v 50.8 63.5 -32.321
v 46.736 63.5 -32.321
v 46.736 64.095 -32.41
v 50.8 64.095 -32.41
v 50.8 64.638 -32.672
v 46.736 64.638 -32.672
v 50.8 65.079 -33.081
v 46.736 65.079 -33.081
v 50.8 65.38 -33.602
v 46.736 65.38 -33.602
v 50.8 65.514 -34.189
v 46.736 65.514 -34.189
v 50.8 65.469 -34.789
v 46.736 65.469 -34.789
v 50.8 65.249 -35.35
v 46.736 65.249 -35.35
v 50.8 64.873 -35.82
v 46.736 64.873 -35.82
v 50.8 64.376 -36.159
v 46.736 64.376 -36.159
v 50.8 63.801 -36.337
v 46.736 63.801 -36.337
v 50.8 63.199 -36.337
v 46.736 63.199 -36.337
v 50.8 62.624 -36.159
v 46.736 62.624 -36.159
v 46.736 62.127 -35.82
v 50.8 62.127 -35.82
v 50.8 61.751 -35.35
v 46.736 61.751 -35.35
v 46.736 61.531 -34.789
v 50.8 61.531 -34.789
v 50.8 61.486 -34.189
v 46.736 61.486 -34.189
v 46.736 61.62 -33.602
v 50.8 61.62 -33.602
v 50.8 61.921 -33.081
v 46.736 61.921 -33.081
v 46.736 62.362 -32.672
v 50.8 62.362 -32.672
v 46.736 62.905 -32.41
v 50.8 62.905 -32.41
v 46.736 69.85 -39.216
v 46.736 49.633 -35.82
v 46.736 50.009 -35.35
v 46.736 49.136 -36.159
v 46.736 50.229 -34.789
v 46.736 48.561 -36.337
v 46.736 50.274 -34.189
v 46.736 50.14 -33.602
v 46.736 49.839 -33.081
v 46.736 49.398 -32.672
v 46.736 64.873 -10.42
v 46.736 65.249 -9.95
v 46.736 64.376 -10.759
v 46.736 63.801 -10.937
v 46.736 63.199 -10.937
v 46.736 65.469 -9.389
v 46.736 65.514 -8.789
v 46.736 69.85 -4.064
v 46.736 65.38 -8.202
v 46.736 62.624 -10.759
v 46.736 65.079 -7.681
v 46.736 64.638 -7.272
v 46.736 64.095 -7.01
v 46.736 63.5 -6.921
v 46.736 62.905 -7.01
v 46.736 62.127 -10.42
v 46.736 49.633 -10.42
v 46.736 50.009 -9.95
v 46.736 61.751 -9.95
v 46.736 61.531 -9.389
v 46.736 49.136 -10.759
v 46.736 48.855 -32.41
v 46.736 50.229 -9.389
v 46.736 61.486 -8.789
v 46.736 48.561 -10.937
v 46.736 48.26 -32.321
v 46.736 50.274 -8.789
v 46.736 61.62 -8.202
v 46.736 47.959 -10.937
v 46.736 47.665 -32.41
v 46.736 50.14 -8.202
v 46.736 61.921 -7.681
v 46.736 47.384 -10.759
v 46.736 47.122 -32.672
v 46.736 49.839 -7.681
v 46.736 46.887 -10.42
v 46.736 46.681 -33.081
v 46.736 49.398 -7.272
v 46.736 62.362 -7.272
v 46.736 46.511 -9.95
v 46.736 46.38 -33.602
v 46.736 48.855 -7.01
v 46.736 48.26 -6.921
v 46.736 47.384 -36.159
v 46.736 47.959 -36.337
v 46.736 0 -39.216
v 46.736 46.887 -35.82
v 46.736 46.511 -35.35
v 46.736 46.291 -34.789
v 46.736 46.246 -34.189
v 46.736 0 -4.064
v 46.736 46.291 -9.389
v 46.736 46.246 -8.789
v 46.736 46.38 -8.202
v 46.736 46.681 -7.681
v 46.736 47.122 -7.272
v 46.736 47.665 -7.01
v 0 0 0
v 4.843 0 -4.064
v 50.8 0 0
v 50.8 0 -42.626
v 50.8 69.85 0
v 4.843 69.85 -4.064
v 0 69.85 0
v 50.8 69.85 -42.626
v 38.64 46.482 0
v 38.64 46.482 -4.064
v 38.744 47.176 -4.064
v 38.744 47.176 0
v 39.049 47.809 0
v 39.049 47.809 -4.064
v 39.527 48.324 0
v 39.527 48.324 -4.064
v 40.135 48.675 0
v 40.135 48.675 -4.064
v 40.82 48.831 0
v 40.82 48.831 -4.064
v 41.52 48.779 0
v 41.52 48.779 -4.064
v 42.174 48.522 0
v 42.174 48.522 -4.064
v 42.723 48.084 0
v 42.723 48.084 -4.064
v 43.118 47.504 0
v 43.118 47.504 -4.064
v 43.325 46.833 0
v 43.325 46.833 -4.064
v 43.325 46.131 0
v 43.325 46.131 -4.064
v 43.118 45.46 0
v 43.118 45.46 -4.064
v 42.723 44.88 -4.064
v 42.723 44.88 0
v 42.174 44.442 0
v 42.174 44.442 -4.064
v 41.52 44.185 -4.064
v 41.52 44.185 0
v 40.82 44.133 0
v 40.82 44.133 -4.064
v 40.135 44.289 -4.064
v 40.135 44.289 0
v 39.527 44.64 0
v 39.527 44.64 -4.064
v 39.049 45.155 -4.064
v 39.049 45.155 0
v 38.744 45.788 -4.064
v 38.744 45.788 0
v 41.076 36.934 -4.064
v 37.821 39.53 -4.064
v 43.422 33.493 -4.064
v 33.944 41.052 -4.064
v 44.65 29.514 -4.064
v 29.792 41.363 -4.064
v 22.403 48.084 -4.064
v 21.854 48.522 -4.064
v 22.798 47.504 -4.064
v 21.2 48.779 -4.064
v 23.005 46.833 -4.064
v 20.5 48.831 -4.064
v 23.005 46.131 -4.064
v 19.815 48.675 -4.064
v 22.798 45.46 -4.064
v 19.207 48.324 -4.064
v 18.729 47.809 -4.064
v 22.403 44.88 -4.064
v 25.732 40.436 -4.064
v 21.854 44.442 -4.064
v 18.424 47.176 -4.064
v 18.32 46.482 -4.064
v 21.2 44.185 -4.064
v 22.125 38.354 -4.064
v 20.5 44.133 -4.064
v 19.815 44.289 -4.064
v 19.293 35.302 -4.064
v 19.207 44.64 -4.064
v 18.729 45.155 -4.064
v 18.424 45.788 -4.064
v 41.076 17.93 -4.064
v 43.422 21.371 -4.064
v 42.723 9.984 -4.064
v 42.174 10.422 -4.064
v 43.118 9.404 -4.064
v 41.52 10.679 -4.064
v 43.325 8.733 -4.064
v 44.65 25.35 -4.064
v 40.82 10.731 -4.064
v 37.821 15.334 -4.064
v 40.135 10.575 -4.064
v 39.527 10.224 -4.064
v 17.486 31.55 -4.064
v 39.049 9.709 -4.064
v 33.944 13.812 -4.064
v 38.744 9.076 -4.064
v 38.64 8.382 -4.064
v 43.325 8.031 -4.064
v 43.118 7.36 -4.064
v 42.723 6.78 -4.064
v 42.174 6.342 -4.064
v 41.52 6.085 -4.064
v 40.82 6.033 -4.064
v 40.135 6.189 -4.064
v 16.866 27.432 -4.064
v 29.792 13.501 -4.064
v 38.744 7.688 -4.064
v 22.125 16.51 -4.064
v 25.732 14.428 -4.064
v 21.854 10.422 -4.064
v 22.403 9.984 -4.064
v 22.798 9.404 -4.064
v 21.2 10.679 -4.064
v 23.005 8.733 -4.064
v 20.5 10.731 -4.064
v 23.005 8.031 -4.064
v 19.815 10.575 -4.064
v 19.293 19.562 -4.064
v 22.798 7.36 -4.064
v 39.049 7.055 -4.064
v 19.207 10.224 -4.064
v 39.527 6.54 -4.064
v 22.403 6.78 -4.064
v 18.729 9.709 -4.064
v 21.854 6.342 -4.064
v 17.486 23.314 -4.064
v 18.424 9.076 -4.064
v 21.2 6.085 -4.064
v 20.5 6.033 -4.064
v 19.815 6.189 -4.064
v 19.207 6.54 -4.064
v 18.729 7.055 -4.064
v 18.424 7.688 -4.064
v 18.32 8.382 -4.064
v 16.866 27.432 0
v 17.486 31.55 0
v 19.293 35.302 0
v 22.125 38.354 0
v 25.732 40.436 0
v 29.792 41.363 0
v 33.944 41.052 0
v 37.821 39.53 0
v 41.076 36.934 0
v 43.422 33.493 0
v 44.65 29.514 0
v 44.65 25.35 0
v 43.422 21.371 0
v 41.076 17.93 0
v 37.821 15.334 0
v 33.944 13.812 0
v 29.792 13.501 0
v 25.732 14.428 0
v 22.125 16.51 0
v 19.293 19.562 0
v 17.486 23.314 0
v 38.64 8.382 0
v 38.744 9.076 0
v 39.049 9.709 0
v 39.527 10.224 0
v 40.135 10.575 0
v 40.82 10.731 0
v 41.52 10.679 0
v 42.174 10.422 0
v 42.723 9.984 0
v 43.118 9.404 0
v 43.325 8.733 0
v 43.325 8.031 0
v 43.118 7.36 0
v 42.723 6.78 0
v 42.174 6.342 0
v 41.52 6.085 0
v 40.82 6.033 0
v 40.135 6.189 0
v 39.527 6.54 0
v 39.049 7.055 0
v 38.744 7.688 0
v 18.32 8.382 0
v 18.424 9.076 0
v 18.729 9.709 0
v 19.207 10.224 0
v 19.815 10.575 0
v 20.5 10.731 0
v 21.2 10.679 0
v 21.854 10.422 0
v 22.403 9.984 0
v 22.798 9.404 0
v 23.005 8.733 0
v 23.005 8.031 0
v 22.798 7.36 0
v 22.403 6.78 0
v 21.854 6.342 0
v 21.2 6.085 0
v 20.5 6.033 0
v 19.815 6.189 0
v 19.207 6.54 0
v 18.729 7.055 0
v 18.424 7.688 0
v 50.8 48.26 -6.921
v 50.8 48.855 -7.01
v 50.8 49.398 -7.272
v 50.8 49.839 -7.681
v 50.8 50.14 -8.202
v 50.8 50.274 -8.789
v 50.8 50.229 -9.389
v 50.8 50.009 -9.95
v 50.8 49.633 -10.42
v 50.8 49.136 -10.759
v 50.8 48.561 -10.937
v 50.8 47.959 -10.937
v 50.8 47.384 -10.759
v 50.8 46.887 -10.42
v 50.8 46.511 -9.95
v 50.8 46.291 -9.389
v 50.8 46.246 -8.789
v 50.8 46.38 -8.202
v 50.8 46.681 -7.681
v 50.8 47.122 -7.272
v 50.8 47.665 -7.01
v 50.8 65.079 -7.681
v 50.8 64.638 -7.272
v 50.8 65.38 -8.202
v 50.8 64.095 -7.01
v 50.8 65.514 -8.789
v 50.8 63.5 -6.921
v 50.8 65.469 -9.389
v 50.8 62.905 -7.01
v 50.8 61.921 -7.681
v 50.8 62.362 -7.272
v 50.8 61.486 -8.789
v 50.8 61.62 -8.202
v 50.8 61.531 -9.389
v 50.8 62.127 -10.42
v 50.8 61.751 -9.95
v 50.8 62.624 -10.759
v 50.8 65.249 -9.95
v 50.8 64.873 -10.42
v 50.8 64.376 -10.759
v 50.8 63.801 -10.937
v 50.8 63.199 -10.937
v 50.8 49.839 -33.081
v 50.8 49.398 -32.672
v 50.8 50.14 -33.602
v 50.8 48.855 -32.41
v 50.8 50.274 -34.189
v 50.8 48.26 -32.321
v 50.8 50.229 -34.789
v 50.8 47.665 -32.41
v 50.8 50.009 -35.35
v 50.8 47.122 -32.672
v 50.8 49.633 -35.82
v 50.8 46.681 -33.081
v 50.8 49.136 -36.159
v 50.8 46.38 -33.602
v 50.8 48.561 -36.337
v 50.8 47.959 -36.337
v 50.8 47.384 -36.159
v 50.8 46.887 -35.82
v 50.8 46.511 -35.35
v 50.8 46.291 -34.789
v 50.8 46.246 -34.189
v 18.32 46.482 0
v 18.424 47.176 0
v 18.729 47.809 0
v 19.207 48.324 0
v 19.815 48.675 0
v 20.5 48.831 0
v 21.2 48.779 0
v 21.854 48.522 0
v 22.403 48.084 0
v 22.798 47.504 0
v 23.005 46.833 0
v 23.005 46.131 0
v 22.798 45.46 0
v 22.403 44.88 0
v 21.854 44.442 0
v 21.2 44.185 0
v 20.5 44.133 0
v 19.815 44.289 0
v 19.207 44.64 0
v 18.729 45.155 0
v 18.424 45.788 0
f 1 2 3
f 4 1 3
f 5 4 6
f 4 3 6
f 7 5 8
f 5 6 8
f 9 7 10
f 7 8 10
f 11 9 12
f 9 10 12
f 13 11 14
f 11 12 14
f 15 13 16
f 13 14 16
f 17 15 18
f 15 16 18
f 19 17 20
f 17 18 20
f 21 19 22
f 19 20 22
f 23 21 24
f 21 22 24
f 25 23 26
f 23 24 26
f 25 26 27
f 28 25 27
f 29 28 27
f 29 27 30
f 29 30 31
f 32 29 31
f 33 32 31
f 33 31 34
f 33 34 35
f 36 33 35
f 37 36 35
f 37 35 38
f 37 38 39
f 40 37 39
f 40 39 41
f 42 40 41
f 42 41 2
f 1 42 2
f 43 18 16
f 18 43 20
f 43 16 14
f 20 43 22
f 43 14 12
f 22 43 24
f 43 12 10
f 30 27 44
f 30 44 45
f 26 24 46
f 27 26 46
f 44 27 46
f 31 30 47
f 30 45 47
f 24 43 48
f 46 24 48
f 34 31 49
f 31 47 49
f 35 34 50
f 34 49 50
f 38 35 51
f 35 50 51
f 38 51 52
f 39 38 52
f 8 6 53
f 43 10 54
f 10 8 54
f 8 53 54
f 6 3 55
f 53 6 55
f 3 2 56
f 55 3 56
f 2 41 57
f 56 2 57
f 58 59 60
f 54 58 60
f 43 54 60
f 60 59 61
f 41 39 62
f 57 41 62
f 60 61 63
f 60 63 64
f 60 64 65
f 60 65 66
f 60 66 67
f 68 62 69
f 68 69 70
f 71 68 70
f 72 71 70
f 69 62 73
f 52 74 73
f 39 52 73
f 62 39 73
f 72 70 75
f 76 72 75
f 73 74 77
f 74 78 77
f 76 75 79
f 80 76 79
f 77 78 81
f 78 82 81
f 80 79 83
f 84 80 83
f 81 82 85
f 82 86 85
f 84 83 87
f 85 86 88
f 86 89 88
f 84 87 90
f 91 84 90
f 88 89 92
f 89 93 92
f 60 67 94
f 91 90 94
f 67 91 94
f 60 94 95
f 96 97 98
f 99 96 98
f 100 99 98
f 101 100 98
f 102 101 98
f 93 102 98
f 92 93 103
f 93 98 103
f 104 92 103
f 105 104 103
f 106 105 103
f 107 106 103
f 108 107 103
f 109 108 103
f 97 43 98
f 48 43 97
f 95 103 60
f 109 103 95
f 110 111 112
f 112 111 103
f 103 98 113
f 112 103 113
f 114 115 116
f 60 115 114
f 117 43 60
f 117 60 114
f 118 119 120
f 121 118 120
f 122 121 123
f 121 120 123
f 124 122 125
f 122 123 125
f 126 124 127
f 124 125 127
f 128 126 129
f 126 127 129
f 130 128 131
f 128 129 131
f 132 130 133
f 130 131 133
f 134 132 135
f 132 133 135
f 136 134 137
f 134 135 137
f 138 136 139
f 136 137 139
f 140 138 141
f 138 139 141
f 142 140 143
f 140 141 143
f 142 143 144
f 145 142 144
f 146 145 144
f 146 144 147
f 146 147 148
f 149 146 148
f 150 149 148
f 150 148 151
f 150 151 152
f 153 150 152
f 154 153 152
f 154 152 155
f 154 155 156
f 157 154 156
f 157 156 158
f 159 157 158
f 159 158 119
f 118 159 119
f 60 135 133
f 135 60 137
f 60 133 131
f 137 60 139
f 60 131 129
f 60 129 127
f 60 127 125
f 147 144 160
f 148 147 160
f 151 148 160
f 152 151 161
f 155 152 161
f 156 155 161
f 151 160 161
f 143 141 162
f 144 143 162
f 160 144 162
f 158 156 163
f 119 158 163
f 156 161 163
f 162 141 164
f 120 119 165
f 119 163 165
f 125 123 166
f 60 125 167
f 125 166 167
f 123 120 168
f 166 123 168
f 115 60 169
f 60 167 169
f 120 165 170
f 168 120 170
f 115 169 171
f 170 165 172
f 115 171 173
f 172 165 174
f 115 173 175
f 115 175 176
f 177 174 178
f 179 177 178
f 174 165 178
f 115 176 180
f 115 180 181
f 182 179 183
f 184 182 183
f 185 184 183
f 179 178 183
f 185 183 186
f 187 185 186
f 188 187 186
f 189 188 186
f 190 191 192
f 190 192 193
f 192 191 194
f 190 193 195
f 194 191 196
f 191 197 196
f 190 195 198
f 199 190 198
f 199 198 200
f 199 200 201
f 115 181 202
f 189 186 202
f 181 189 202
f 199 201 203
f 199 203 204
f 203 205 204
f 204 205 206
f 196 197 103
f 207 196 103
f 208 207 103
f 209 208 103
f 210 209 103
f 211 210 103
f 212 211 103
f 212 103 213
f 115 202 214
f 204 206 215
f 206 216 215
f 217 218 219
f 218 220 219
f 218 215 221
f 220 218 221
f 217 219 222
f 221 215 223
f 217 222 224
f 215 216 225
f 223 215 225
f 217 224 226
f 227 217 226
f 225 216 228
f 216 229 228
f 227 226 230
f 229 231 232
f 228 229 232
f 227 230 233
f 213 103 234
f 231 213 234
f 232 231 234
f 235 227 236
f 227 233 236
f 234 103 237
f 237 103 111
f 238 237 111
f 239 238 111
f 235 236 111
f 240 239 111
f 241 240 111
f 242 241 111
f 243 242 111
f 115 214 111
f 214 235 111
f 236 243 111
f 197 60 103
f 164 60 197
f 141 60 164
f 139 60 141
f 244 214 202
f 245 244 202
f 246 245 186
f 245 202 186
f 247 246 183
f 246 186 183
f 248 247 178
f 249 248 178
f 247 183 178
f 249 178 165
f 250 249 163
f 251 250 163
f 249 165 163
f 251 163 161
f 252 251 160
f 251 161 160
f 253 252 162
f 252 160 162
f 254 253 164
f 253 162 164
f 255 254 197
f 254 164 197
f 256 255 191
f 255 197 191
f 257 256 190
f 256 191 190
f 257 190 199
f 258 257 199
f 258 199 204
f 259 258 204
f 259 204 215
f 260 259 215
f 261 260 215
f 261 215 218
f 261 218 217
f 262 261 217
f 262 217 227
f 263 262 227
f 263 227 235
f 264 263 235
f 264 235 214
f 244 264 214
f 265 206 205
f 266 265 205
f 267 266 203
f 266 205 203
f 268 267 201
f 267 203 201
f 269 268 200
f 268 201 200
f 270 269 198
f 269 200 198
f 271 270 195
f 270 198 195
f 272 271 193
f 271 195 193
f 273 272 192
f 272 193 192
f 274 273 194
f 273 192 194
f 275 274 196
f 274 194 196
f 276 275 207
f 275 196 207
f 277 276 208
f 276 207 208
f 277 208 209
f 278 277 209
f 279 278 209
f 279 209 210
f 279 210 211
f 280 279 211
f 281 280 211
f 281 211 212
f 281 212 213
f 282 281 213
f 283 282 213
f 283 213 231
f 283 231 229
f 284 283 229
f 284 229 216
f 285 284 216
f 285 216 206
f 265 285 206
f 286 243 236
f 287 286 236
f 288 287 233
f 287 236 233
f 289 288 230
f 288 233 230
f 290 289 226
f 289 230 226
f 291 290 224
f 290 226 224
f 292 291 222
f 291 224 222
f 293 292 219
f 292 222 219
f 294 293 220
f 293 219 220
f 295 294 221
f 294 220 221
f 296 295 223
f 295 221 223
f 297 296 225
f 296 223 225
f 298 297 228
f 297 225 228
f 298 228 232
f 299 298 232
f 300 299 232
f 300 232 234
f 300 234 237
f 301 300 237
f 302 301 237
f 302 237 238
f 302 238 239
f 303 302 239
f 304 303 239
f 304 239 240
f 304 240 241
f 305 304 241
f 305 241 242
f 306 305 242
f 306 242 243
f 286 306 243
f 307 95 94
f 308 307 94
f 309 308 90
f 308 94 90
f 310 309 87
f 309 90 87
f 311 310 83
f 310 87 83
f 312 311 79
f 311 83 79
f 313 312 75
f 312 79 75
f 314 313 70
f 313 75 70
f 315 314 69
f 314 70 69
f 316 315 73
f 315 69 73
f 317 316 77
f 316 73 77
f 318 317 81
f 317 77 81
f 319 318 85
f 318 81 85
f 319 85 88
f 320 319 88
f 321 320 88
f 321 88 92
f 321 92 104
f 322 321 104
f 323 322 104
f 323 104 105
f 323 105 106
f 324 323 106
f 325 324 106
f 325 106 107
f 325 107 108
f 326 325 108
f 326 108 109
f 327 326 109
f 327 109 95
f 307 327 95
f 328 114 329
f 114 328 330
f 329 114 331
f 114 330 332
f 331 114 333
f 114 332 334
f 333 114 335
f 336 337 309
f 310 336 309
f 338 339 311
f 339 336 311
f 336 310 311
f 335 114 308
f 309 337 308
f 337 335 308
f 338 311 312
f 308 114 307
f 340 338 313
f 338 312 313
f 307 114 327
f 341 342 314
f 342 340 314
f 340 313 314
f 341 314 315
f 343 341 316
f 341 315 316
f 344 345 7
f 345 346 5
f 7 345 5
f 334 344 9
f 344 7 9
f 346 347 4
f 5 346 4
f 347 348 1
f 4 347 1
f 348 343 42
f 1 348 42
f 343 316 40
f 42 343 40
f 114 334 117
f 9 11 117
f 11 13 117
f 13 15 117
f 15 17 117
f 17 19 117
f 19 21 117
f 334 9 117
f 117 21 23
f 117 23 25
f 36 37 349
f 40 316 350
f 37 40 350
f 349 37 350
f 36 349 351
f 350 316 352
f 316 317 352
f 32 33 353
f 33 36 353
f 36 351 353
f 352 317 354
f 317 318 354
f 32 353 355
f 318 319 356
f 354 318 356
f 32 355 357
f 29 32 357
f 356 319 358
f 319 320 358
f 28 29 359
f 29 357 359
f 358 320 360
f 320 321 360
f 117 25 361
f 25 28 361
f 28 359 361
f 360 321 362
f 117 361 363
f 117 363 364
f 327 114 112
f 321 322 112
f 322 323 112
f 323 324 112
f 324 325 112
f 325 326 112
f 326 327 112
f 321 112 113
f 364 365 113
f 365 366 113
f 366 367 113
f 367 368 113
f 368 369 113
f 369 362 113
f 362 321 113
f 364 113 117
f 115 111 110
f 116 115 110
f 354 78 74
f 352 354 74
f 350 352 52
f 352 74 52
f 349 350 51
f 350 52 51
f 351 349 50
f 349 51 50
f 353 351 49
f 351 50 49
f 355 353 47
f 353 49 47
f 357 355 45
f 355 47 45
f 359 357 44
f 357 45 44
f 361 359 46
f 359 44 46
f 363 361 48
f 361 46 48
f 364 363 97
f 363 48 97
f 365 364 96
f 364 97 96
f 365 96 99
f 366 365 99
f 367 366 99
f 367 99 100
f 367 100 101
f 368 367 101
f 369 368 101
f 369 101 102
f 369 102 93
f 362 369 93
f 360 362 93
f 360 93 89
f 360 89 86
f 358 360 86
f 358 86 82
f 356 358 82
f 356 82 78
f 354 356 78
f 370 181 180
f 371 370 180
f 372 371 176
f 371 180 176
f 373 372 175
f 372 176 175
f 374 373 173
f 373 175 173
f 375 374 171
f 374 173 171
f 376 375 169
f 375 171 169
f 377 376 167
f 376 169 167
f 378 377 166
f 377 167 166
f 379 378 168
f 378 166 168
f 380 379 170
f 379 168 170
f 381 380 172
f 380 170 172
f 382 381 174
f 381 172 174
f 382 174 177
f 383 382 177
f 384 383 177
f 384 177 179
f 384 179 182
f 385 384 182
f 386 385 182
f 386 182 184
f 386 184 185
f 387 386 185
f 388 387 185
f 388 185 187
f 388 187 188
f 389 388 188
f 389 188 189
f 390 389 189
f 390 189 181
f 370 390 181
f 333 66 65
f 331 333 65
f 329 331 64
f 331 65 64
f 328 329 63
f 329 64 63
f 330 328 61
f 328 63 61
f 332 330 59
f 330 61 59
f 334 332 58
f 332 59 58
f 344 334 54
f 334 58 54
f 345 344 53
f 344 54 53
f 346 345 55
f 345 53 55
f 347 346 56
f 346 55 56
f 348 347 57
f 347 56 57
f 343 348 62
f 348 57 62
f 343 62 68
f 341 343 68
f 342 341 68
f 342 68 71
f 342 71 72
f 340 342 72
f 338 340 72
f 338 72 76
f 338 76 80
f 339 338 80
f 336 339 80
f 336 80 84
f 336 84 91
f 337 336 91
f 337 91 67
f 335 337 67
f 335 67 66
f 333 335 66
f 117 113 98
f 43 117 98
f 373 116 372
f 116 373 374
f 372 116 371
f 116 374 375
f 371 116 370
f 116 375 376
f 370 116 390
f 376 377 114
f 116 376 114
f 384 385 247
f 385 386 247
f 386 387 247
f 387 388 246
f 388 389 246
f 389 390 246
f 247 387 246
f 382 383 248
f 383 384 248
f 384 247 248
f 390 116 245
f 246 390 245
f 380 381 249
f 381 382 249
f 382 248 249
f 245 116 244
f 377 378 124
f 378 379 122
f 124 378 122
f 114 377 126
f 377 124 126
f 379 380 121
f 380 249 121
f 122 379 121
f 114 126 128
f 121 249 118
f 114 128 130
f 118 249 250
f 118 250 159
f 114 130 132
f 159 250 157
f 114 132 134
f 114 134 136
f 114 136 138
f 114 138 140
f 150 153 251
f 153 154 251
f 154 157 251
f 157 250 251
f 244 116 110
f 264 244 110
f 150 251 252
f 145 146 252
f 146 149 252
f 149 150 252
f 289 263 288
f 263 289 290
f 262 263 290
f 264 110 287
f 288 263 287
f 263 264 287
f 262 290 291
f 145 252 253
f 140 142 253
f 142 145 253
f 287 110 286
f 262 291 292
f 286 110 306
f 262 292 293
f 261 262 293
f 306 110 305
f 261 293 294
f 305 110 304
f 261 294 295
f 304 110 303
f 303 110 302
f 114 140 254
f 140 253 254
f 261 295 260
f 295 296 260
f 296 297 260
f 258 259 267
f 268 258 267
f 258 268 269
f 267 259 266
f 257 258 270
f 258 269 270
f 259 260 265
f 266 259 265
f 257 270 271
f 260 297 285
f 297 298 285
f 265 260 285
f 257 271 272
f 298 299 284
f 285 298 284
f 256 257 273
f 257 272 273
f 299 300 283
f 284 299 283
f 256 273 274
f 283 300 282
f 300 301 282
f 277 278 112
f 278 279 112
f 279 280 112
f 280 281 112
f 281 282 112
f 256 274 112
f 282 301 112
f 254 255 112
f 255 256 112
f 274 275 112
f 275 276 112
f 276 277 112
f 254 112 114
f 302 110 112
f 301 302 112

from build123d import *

# Parameters (mm, degrees)
BOSS_EXTRUDE1_DEPTH = 69.85
SKETCH2_R           = 2.0193
CUT_EXTRUDE1_DEPTH  = 5.064
SKETCH3_R           = 2.35585
SKETCH3_R_2         = 13.97
CUT_EXTRUDE2_DEPTH  = 5.064


with BuildPart() as part:
    # Sketch1 → Boss-Extrude1 (new body)
    with BuildSketch(Plane(origin=(0, 0, 0), x_dir=(1, 0, 0), z_dir=(0, 1, 0))):
        Polygon((0, 0), (50.8, 0), (50.8, 42.626261264), (46.736, 39.216160363), (46.736, 4.064), (4.8432866, 4.064), align=None)
    extrude(amount=BOSS_EXTRUDE1_DEPTH)

    # Sketch2 → Cut-Extrude1 (cut, through all)
    with BuildSketch(Plane.ZY.offset(-46.736)):
        with Locations((-34.340080181, 63.5)):
            Circle(SKETCH2_R)
        with Locations((-8.940080181, 63.5)):
            Circle(SKETCH2_R)
        with Locations((-8.940080181, 48.26)):
            Circle(SKETCH2_R)
        with Locations((-34.340080181, 48.26)):
            Circle(SKETCH2_R)
    extrude(amount=-CUT_EXTRUDE1_DEPTH, mode=Mode.SUBTRACT)

    # Sketch3 → Cut-Extrude2 (cut, through all)
    with BuildSketch(Plane(origin=(0, 0, -4.064), x_dir=(-1, 0, 0), z_dir=(0, 0, -1))):
        with Locations((-40.9956, 46.482)):
            Circle(SKETCH3_R)
        with Locations((-20.6756, 46.482)):
            Circle(SKETCH3_R)
        with Locations((-20.6756, 8.382)):
            Circle(SKETCH3_R)
        with Locations((-40.9956, 8.382)):
            Circle(SKETCH3_R)
        with Locations((-30.8356, 27.432)):
            Circle(SKETCH3_R_2)
    extrude(amount=-CUT_EXTRUDE2_DEPTH, mode=Mode.SUBTRACT)


solid = part.part
